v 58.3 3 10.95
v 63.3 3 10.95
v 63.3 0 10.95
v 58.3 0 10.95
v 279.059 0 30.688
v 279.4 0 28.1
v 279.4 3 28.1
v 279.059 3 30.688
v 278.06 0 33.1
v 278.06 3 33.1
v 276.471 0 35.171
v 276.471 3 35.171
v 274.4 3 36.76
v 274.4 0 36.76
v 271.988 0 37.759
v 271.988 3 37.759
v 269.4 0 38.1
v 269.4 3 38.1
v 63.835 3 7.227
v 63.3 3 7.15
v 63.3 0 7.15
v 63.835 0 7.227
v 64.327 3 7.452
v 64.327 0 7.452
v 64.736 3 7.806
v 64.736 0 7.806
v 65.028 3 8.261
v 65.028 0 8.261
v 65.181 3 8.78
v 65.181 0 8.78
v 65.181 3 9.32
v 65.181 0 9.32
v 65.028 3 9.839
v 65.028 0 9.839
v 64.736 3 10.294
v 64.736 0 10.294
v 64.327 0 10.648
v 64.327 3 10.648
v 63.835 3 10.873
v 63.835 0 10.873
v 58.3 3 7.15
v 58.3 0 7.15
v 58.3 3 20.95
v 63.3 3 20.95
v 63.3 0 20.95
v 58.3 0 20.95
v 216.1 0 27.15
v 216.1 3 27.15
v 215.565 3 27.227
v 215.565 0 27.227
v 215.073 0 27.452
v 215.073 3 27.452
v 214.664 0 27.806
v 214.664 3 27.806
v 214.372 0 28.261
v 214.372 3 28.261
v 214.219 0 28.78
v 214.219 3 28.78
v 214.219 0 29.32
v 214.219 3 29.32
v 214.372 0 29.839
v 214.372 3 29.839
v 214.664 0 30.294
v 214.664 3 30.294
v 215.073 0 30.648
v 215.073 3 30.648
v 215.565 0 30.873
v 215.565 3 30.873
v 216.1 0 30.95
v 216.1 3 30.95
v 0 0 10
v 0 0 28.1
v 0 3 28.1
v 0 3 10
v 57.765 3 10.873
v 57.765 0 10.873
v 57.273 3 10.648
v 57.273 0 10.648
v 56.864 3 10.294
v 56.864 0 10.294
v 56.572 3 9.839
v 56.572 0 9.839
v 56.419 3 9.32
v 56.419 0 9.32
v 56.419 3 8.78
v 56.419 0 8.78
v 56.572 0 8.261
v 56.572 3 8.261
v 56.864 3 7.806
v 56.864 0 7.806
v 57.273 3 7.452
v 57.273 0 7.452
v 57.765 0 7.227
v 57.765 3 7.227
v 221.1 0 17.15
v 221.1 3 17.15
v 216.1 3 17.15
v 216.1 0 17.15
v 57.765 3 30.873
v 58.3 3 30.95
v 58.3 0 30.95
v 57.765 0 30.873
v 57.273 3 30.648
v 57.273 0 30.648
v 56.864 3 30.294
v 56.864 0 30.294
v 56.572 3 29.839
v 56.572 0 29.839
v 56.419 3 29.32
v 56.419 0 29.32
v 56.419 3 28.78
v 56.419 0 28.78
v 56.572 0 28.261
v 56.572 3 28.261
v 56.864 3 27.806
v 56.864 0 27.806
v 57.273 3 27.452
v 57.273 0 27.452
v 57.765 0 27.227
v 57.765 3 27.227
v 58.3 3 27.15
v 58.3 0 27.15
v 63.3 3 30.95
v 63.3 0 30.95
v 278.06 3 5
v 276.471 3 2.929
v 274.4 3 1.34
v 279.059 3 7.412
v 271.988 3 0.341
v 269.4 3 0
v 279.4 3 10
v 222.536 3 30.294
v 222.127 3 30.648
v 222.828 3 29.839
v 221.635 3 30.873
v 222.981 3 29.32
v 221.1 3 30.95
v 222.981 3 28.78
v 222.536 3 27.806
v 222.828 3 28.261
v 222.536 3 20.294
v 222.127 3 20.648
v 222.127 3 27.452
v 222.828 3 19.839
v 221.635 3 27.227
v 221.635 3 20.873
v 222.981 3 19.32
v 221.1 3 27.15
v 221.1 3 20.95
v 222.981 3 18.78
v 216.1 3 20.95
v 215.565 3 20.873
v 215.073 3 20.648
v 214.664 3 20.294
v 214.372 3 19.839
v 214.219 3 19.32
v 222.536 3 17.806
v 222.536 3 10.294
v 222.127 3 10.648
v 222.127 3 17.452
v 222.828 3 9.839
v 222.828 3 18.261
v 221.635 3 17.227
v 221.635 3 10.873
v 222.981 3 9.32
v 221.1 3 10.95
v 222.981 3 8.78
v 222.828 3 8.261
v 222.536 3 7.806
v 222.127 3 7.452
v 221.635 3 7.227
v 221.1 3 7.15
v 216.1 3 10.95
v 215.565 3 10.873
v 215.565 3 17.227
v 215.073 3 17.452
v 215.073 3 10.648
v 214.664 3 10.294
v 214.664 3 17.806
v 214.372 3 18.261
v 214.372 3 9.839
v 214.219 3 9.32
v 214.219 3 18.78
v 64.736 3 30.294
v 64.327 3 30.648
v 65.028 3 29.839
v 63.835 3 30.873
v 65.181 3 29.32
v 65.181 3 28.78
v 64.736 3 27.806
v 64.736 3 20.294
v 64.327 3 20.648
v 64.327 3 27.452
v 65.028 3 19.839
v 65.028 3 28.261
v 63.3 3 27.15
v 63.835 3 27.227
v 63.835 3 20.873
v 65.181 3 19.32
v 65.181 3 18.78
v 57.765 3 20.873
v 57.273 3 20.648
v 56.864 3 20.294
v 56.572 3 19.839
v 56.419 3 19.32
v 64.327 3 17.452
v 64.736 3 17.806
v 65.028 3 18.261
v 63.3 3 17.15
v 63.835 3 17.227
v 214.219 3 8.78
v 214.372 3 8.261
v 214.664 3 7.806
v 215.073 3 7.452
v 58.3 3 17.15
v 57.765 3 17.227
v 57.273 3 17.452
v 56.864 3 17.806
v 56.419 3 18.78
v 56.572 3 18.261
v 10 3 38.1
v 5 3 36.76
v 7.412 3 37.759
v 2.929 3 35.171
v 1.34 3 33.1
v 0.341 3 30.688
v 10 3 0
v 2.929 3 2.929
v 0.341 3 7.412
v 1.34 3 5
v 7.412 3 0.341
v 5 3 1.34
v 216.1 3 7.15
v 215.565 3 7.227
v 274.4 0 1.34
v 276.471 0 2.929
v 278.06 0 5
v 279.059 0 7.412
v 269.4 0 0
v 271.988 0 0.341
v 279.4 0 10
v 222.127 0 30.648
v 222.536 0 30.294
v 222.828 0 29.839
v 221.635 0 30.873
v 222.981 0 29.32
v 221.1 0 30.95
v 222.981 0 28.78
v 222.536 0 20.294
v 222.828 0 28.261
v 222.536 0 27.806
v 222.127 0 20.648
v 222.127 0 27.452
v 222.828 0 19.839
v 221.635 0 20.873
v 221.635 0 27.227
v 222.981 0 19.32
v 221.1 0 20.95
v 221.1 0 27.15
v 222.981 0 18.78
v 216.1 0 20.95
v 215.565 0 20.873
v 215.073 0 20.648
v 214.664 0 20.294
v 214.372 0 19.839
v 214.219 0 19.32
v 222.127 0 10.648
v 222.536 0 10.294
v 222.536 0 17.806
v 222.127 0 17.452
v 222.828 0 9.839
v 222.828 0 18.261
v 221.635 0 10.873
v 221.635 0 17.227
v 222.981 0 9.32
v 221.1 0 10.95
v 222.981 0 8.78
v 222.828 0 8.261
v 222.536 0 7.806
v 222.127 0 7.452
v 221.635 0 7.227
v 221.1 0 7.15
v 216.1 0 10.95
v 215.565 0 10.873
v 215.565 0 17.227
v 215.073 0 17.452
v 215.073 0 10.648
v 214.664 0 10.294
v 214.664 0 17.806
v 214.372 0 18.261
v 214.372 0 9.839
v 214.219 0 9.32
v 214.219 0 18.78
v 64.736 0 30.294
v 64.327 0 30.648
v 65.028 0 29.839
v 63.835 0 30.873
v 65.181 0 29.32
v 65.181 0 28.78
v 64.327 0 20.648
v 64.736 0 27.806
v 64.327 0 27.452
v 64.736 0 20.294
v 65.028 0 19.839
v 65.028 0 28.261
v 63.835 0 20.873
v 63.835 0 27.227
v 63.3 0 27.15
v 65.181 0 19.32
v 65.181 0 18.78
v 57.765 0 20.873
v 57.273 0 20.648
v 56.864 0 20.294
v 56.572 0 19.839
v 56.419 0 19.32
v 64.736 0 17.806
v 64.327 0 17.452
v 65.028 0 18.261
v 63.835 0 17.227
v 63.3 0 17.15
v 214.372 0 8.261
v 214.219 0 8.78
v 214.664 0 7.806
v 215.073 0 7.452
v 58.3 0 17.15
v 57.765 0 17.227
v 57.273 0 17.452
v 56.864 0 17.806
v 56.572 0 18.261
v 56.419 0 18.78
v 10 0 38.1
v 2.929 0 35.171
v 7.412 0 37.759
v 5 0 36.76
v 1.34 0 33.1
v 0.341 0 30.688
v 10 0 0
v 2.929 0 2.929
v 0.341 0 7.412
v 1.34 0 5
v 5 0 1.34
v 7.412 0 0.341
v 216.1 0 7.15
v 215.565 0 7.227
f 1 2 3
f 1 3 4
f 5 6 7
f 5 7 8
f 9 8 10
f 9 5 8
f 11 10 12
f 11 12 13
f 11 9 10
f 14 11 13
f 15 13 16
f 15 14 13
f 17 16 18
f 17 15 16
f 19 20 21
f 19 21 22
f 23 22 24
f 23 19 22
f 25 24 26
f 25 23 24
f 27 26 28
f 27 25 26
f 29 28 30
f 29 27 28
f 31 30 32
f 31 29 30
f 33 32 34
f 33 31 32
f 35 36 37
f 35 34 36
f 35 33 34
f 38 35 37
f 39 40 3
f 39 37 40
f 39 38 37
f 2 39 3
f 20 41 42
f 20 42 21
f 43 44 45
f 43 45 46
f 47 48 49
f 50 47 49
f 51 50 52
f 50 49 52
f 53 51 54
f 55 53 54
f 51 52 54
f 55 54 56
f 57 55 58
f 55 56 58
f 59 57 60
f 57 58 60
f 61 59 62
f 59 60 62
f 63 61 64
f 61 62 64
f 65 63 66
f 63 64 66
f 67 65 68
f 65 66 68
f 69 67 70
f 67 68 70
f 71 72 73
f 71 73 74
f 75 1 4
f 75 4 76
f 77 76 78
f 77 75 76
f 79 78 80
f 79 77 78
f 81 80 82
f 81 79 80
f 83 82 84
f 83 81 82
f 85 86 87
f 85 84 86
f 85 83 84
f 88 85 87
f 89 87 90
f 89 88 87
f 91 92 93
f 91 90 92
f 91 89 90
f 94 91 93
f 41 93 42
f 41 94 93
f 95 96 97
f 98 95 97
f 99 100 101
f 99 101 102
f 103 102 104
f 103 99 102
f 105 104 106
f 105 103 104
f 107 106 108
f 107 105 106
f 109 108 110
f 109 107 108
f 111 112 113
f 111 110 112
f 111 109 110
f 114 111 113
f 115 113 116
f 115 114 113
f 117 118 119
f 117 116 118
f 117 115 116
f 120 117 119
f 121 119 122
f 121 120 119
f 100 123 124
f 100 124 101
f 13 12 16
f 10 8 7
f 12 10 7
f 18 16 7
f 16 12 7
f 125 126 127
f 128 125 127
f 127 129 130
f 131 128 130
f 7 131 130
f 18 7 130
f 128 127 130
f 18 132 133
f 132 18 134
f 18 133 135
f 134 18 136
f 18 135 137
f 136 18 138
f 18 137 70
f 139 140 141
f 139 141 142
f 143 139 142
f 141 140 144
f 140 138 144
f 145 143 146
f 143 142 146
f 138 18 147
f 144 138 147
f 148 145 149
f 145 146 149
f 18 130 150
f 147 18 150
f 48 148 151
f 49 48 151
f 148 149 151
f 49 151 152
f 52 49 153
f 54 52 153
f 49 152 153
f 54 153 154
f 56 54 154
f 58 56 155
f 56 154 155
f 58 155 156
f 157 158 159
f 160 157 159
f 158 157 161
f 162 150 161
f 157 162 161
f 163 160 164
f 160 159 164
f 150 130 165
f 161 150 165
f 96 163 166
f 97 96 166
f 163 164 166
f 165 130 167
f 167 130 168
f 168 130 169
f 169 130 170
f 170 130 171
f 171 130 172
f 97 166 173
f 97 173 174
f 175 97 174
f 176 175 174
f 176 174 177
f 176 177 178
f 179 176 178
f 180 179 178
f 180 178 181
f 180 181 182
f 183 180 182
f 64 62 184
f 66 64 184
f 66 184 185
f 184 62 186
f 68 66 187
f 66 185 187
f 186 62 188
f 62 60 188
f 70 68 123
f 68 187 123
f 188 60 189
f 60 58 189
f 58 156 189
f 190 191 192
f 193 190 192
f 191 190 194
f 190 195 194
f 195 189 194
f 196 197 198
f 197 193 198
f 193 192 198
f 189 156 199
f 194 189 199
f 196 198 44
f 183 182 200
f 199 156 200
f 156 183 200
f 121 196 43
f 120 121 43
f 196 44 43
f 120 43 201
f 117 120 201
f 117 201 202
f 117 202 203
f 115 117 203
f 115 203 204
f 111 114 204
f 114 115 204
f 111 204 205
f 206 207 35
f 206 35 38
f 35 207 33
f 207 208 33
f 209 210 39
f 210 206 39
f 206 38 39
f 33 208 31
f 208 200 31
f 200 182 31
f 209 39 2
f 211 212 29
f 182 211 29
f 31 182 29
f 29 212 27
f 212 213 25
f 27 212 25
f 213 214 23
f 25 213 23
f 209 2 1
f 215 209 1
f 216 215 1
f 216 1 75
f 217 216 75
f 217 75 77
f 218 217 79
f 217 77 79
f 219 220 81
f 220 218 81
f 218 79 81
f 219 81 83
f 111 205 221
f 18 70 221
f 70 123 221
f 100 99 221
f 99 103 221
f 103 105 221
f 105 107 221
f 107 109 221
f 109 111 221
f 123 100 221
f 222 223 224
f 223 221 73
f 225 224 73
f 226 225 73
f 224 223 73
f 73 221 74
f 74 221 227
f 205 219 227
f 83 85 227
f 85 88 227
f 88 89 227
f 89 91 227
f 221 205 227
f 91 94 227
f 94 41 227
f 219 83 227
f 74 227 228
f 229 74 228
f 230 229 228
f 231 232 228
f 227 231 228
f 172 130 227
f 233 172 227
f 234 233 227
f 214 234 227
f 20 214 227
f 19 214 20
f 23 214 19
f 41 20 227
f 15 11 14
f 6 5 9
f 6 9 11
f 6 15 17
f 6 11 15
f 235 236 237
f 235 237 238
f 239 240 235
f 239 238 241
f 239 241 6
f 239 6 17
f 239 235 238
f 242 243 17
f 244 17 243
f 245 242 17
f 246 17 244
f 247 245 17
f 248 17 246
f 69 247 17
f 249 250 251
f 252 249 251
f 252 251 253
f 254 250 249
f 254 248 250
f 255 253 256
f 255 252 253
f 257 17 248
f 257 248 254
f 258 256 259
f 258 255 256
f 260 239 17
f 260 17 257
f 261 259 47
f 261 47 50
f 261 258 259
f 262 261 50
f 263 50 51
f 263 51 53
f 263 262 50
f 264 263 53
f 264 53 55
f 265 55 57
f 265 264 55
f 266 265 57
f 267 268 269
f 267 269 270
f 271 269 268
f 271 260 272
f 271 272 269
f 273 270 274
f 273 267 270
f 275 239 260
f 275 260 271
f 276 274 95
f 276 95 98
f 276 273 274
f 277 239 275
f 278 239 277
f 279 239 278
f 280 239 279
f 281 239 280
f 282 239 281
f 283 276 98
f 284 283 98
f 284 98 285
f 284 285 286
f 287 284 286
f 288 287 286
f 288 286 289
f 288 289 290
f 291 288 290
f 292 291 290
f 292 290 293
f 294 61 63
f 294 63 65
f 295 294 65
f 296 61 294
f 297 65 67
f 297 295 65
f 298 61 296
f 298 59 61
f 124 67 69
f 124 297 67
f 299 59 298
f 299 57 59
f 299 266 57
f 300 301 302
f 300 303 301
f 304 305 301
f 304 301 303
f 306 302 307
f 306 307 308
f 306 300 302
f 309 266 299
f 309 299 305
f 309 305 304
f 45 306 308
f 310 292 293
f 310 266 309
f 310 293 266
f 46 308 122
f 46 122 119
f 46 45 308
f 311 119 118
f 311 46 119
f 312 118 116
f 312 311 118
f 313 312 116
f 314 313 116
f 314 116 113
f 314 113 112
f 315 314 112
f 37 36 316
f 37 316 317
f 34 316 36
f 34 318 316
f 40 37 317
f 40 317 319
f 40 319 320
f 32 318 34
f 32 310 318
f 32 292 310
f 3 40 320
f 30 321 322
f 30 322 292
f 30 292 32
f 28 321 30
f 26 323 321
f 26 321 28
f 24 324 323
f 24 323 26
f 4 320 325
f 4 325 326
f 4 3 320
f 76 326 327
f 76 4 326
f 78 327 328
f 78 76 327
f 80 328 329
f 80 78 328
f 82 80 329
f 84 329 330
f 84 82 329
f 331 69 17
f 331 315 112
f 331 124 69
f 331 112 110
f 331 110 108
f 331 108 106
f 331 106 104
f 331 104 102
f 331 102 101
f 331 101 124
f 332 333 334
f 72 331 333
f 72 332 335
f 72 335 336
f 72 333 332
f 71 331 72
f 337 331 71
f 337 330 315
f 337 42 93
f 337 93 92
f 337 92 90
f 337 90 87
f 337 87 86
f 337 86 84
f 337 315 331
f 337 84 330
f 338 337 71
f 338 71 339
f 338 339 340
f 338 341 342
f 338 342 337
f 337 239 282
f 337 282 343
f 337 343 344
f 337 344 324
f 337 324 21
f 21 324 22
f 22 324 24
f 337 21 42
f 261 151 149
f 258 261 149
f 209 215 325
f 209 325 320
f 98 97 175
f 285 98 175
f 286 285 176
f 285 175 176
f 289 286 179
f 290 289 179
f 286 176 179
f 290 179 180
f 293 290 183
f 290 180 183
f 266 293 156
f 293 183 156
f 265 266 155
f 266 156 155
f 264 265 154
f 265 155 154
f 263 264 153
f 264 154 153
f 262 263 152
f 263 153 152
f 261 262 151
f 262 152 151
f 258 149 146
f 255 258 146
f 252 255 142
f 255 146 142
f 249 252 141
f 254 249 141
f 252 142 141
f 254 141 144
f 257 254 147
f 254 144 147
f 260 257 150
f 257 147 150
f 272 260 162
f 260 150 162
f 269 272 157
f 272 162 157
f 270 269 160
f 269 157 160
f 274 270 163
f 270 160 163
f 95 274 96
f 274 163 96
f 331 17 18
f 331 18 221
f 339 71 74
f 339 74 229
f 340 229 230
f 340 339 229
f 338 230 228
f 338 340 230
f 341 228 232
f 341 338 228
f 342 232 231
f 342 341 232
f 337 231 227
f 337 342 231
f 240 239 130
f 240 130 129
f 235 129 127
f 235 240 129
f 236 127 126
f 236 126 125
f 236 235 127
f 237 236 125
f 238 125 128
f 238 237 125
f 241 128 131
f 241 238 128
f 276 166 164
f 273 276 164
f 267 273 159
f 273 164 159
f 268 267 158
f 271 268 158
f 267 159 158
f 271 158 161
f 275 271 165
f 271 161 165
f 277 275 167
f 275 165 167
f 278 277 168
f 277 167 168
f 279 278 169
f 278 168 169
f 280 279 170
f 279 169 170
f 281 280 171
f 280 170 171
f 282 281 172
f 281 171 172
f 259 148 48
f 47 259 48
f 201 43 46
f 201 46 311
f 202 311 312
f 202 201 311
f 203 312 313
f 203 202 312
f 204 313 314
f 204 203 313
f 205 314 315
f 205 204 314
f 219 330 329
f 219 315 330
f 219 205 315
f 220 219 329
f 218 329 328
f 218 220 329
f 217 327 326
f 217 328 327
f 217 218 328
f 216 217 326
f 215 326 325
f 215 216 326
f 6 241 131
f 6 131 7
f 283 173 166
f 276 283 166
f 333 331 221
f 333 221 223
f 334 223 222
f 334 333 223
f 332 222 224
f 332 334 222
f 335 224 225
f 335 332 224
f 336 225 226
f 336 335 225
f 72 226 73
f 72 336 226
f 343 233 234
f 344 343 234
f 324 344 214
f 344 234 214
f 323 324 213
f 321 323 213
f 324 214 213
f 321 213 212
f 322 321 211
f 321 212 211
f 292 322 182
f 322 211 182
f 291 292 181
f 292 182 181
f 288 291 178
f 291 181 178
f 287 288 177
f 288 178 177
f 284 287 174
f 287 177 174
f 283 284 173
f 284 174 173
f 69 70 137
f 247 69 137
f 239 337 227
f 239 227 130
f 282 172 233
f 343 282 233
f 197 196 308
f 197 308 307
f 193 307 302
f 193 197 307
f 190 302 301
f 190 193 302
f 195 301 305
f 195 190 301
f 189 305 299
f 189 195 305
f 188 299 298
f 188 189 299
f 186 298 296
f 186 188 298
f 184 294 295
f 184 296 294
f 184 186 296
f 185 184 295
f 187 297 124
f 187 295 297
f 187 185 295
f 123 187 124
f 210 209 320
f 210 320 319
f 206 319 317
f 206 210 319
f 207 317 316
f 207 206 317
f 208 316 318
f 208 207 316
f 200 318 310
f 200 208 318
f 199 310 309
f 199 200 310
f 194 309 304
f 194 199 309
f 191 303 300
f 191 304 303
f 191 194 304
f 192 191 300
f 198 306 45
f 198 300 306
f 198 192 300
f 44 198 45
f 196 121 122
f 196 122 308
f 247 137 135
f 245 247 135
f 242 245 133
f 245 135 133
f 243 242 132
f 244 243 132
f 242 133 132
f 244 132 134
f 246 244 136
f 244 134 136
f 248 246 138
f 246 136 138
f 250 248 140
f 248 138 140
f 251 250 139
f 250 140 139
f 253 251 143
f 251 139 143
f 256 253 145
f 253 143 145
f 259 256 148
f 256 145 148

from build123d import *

# Parameters (mm, degrees)
BOSS_EXTRUDE1_DEPTH = 3
CUT_EXTRUDE1_REACH  = 284.002


with BuildPart() as part:
    # Sketch1 → Boss-Extrude1 (new body)
    with BuildSketch(Plane(origin=(0, 0, 0), x_dir=(1, 0, 0), z_dir=(0, 1, 0))):
        with BuildLine():
            Line((10, 0), (269.4, 0))
            ThreePointArc((269.4, 0), (276.471067812, -2.928932188), (279.4, -10))
            Line((279.4, -10), (279.4, -28.1))
            ThreePointArc((279.4, -28.1), (276.471067812, -35.171067812), (269.4, -38.1))
            Line((269.4, -38.1), (10, -38.1))
            ThreePointArc((10, -38.1), (2.928932188, -35.171067812), (0, -28.1))
            Line((0, -28.1), (0, -10))
            ThreePointArc((0, -10), (2.928932188, -2.928932188), (10, 0))
        make_face()
    extrude(amount=BOSS_EXTRUDE1_DEPTH)

    # Sketch2 → Cut-Extrude1 (cut, up to next)
    with BuildSketch(Plane(origin=(0, 3, 0), x_dir=(1, 0, 0), z_dir=(0, 1, 0)), mode=Mode.PRIVATE) as cut_extrude1_sk1:
        with BuildLine():
            Line((58.3, -17.15), (63.3, -17.15))
            ThreePointArc((63.3, -17.15), (65.2, -19.05), (63.3, -20.95))
            Line((63.3, -20.95), (58.3, -20.95))
            ThreePointArc((58.3, -20.95), (56.4, -19.05), (58.3, -17.15))
        make_face()
    cut_extrude1_tool1 = extrude(cut_extrude1_sk1.sketch, amount=-CUT_EXTRUDE1_REACH, mode=Mode.PRIVATE) & part.part
    # Sketch2 → Cut-Extrude1 (cut, up to next)
    with BuildSketch(Plane(origin=(0, 3, 0), x_dir=(1, 0, 0), z_dir=(0, 1, 0)), mode=Mode.PRIVATE) as cut_extrude1_sk2:
        with BuildLine():
            Line((221.1, -17.15), (216.1, -17.15))
            ThreePointArc((216.1, -17.15), (214.2, -19.05), (216.1, -20.95))
            Line((216.1, -20.95), (221.1, -20.95))
            ThreePointArc((221.1, -20.95), (223, -19.05), (221.1, -17.15))
        make_face()
    cut_extrude1_tool2 = extrude(cut_extrude1_sk2.sketch, amount=-CUT_EXTRUDE1_REACH, mode=Mode.PRIVATE) & part.part
    # Sketch2 → Cut-Extrude1 (cut, up to next)
    with BuildSketch(Plane(origin=(0, 3, 0), x_dir=(1, 0, 0), z_dir=(0, 1, 0)), mode=Mode.PRIVATE) as cut_extrude1_sk3:
        with BuildLine():
            Line((221.1, -27.15), (216.1, -27.15))
            ThreePointArc((216.1, -27.15), (214.2, -29.05), (216.1, -30.95))
            Line((216.1, -30.95), (221.1, -30.95))
            ThreePointArc((221.1, -30.95), (223, -29.05), (221.1, -27.15))
        make_face()
    cut_extrude1_tool3 = extrude(cut_extrude1_sk3.sketch, amount=-CUT_EXTRUDE1_REACH, mode=Mode.PRIVATE) & part.part
    # Sketch2 → Cut-Extrude1 (cut, up to next)
    with BuildSketch(Plane(origin=(0, 3, 0), x_dir=(1, 0, 0), z_dir=(0, 1, 0)), mode=Mode.PRIVATE) as cut_extrude1_sk4:
        with BuildLine():
            Line((221.1, -7.15), (216.1, -7.15))
            ThreePointArc((216.1, -7.15), (214.2, -9.05), (216.1, -10.95))
            Line((216.1, -10.95), (221.1, -10.95))
            ThreePointArc((221.1, -10.95), (223, -9.05), (221.1, -7.15))
        make_face()
    cut_extrude1_tool4 = extrude(cut_extrude1_sk4.sketch, amount=-CUT_EXTRUDE1_REACH, mode=Mode.PRIVATE) & part.part
    # Sketch2 → Cut-Extrude1 (cut, up to next)
    with BuildSketch(Plane(origin=(0, 3, 0), x_dir=(1, 0, 0), z_dir=(0, 1, 0)), mode=Mode.PRIVATE) as cut_extrude1_sk5:
        with BuildLine():
            Line((58.3, -27.15), (63.3, -27.15))
            ThreePointArc((63.3, -27.15), (65.2, -29.05), (63.3, -30.95))
            Line((63.3, -30.95), (58.3, -30.95))
            ThreePointArc((58.3, -30.95), (56.4, -29.05), (58.3, -27.15))
        make_face()
    cut_extrude1_tool5 = extrude(cut_extrude1_sk5.sketch, amount=-CUT_EXTRUDE1_REACH, mode=Mode.PRIVATE) & part.part
    # Sketch2 → Cut-Extrude1 (cut, up to next)
    with BuildSketch(Plane(origin=(0, 3, 0), x_dir=(1, 0, 0), z_dir=(0, 1, 0)), mode=Mode.PRIVATE) as cut_extrude1_sk6:
        with BuildLine():
            Line((58.3, -7.15), (63.3, -7.15))
            ThreePointArc((63.3, -7.15), (65.2, -9.05), (63.3, -10.95))
            Line((63.3, -10.95), (58.3, -10.95))
            ThreePointArc((58.3, -10.95), (56.4, -9.05), (58.3, -7.15))
        make_face()
    cut_extrude1_tool6 = extrude(cut_extrude1_sk6.sketch, amount=-CUT_EXTRUDE1_REACH, mode=Mode.PRIVATE) & part.part
    add(cut_extrude1_tool1.solids().sort_by_distance((60.8, 3, 19.05))[0], mode=Mode.SUBTRACT)
    add(cut_extrude1_tool2.solids().sort_by_distance((218.6, 3, 19.05))[0], mode=Mode.SUBTRACT)
    add(cut_extrude1_tool3.solids().sort_by_distance((218.6, 3, 29.05))[0], mode=Mode.SUBTRACT)
    add(cut_extrude1_tool4.solids().sort_by_distance((218.6, 3, 9.05))[0], mode=Mode.SUBTRACT)
    add(cut_extrude1_tool5.solids().sort_by_distance((60.8, 3, 29.05))[0], mode=Mode.SUBTRACT)
    add(cut_extrude1_tool6.solids().sort_by_distance((60.8, 3, 9.05))[0], mode=Mode.SUBTRACT)


solid = part.part
